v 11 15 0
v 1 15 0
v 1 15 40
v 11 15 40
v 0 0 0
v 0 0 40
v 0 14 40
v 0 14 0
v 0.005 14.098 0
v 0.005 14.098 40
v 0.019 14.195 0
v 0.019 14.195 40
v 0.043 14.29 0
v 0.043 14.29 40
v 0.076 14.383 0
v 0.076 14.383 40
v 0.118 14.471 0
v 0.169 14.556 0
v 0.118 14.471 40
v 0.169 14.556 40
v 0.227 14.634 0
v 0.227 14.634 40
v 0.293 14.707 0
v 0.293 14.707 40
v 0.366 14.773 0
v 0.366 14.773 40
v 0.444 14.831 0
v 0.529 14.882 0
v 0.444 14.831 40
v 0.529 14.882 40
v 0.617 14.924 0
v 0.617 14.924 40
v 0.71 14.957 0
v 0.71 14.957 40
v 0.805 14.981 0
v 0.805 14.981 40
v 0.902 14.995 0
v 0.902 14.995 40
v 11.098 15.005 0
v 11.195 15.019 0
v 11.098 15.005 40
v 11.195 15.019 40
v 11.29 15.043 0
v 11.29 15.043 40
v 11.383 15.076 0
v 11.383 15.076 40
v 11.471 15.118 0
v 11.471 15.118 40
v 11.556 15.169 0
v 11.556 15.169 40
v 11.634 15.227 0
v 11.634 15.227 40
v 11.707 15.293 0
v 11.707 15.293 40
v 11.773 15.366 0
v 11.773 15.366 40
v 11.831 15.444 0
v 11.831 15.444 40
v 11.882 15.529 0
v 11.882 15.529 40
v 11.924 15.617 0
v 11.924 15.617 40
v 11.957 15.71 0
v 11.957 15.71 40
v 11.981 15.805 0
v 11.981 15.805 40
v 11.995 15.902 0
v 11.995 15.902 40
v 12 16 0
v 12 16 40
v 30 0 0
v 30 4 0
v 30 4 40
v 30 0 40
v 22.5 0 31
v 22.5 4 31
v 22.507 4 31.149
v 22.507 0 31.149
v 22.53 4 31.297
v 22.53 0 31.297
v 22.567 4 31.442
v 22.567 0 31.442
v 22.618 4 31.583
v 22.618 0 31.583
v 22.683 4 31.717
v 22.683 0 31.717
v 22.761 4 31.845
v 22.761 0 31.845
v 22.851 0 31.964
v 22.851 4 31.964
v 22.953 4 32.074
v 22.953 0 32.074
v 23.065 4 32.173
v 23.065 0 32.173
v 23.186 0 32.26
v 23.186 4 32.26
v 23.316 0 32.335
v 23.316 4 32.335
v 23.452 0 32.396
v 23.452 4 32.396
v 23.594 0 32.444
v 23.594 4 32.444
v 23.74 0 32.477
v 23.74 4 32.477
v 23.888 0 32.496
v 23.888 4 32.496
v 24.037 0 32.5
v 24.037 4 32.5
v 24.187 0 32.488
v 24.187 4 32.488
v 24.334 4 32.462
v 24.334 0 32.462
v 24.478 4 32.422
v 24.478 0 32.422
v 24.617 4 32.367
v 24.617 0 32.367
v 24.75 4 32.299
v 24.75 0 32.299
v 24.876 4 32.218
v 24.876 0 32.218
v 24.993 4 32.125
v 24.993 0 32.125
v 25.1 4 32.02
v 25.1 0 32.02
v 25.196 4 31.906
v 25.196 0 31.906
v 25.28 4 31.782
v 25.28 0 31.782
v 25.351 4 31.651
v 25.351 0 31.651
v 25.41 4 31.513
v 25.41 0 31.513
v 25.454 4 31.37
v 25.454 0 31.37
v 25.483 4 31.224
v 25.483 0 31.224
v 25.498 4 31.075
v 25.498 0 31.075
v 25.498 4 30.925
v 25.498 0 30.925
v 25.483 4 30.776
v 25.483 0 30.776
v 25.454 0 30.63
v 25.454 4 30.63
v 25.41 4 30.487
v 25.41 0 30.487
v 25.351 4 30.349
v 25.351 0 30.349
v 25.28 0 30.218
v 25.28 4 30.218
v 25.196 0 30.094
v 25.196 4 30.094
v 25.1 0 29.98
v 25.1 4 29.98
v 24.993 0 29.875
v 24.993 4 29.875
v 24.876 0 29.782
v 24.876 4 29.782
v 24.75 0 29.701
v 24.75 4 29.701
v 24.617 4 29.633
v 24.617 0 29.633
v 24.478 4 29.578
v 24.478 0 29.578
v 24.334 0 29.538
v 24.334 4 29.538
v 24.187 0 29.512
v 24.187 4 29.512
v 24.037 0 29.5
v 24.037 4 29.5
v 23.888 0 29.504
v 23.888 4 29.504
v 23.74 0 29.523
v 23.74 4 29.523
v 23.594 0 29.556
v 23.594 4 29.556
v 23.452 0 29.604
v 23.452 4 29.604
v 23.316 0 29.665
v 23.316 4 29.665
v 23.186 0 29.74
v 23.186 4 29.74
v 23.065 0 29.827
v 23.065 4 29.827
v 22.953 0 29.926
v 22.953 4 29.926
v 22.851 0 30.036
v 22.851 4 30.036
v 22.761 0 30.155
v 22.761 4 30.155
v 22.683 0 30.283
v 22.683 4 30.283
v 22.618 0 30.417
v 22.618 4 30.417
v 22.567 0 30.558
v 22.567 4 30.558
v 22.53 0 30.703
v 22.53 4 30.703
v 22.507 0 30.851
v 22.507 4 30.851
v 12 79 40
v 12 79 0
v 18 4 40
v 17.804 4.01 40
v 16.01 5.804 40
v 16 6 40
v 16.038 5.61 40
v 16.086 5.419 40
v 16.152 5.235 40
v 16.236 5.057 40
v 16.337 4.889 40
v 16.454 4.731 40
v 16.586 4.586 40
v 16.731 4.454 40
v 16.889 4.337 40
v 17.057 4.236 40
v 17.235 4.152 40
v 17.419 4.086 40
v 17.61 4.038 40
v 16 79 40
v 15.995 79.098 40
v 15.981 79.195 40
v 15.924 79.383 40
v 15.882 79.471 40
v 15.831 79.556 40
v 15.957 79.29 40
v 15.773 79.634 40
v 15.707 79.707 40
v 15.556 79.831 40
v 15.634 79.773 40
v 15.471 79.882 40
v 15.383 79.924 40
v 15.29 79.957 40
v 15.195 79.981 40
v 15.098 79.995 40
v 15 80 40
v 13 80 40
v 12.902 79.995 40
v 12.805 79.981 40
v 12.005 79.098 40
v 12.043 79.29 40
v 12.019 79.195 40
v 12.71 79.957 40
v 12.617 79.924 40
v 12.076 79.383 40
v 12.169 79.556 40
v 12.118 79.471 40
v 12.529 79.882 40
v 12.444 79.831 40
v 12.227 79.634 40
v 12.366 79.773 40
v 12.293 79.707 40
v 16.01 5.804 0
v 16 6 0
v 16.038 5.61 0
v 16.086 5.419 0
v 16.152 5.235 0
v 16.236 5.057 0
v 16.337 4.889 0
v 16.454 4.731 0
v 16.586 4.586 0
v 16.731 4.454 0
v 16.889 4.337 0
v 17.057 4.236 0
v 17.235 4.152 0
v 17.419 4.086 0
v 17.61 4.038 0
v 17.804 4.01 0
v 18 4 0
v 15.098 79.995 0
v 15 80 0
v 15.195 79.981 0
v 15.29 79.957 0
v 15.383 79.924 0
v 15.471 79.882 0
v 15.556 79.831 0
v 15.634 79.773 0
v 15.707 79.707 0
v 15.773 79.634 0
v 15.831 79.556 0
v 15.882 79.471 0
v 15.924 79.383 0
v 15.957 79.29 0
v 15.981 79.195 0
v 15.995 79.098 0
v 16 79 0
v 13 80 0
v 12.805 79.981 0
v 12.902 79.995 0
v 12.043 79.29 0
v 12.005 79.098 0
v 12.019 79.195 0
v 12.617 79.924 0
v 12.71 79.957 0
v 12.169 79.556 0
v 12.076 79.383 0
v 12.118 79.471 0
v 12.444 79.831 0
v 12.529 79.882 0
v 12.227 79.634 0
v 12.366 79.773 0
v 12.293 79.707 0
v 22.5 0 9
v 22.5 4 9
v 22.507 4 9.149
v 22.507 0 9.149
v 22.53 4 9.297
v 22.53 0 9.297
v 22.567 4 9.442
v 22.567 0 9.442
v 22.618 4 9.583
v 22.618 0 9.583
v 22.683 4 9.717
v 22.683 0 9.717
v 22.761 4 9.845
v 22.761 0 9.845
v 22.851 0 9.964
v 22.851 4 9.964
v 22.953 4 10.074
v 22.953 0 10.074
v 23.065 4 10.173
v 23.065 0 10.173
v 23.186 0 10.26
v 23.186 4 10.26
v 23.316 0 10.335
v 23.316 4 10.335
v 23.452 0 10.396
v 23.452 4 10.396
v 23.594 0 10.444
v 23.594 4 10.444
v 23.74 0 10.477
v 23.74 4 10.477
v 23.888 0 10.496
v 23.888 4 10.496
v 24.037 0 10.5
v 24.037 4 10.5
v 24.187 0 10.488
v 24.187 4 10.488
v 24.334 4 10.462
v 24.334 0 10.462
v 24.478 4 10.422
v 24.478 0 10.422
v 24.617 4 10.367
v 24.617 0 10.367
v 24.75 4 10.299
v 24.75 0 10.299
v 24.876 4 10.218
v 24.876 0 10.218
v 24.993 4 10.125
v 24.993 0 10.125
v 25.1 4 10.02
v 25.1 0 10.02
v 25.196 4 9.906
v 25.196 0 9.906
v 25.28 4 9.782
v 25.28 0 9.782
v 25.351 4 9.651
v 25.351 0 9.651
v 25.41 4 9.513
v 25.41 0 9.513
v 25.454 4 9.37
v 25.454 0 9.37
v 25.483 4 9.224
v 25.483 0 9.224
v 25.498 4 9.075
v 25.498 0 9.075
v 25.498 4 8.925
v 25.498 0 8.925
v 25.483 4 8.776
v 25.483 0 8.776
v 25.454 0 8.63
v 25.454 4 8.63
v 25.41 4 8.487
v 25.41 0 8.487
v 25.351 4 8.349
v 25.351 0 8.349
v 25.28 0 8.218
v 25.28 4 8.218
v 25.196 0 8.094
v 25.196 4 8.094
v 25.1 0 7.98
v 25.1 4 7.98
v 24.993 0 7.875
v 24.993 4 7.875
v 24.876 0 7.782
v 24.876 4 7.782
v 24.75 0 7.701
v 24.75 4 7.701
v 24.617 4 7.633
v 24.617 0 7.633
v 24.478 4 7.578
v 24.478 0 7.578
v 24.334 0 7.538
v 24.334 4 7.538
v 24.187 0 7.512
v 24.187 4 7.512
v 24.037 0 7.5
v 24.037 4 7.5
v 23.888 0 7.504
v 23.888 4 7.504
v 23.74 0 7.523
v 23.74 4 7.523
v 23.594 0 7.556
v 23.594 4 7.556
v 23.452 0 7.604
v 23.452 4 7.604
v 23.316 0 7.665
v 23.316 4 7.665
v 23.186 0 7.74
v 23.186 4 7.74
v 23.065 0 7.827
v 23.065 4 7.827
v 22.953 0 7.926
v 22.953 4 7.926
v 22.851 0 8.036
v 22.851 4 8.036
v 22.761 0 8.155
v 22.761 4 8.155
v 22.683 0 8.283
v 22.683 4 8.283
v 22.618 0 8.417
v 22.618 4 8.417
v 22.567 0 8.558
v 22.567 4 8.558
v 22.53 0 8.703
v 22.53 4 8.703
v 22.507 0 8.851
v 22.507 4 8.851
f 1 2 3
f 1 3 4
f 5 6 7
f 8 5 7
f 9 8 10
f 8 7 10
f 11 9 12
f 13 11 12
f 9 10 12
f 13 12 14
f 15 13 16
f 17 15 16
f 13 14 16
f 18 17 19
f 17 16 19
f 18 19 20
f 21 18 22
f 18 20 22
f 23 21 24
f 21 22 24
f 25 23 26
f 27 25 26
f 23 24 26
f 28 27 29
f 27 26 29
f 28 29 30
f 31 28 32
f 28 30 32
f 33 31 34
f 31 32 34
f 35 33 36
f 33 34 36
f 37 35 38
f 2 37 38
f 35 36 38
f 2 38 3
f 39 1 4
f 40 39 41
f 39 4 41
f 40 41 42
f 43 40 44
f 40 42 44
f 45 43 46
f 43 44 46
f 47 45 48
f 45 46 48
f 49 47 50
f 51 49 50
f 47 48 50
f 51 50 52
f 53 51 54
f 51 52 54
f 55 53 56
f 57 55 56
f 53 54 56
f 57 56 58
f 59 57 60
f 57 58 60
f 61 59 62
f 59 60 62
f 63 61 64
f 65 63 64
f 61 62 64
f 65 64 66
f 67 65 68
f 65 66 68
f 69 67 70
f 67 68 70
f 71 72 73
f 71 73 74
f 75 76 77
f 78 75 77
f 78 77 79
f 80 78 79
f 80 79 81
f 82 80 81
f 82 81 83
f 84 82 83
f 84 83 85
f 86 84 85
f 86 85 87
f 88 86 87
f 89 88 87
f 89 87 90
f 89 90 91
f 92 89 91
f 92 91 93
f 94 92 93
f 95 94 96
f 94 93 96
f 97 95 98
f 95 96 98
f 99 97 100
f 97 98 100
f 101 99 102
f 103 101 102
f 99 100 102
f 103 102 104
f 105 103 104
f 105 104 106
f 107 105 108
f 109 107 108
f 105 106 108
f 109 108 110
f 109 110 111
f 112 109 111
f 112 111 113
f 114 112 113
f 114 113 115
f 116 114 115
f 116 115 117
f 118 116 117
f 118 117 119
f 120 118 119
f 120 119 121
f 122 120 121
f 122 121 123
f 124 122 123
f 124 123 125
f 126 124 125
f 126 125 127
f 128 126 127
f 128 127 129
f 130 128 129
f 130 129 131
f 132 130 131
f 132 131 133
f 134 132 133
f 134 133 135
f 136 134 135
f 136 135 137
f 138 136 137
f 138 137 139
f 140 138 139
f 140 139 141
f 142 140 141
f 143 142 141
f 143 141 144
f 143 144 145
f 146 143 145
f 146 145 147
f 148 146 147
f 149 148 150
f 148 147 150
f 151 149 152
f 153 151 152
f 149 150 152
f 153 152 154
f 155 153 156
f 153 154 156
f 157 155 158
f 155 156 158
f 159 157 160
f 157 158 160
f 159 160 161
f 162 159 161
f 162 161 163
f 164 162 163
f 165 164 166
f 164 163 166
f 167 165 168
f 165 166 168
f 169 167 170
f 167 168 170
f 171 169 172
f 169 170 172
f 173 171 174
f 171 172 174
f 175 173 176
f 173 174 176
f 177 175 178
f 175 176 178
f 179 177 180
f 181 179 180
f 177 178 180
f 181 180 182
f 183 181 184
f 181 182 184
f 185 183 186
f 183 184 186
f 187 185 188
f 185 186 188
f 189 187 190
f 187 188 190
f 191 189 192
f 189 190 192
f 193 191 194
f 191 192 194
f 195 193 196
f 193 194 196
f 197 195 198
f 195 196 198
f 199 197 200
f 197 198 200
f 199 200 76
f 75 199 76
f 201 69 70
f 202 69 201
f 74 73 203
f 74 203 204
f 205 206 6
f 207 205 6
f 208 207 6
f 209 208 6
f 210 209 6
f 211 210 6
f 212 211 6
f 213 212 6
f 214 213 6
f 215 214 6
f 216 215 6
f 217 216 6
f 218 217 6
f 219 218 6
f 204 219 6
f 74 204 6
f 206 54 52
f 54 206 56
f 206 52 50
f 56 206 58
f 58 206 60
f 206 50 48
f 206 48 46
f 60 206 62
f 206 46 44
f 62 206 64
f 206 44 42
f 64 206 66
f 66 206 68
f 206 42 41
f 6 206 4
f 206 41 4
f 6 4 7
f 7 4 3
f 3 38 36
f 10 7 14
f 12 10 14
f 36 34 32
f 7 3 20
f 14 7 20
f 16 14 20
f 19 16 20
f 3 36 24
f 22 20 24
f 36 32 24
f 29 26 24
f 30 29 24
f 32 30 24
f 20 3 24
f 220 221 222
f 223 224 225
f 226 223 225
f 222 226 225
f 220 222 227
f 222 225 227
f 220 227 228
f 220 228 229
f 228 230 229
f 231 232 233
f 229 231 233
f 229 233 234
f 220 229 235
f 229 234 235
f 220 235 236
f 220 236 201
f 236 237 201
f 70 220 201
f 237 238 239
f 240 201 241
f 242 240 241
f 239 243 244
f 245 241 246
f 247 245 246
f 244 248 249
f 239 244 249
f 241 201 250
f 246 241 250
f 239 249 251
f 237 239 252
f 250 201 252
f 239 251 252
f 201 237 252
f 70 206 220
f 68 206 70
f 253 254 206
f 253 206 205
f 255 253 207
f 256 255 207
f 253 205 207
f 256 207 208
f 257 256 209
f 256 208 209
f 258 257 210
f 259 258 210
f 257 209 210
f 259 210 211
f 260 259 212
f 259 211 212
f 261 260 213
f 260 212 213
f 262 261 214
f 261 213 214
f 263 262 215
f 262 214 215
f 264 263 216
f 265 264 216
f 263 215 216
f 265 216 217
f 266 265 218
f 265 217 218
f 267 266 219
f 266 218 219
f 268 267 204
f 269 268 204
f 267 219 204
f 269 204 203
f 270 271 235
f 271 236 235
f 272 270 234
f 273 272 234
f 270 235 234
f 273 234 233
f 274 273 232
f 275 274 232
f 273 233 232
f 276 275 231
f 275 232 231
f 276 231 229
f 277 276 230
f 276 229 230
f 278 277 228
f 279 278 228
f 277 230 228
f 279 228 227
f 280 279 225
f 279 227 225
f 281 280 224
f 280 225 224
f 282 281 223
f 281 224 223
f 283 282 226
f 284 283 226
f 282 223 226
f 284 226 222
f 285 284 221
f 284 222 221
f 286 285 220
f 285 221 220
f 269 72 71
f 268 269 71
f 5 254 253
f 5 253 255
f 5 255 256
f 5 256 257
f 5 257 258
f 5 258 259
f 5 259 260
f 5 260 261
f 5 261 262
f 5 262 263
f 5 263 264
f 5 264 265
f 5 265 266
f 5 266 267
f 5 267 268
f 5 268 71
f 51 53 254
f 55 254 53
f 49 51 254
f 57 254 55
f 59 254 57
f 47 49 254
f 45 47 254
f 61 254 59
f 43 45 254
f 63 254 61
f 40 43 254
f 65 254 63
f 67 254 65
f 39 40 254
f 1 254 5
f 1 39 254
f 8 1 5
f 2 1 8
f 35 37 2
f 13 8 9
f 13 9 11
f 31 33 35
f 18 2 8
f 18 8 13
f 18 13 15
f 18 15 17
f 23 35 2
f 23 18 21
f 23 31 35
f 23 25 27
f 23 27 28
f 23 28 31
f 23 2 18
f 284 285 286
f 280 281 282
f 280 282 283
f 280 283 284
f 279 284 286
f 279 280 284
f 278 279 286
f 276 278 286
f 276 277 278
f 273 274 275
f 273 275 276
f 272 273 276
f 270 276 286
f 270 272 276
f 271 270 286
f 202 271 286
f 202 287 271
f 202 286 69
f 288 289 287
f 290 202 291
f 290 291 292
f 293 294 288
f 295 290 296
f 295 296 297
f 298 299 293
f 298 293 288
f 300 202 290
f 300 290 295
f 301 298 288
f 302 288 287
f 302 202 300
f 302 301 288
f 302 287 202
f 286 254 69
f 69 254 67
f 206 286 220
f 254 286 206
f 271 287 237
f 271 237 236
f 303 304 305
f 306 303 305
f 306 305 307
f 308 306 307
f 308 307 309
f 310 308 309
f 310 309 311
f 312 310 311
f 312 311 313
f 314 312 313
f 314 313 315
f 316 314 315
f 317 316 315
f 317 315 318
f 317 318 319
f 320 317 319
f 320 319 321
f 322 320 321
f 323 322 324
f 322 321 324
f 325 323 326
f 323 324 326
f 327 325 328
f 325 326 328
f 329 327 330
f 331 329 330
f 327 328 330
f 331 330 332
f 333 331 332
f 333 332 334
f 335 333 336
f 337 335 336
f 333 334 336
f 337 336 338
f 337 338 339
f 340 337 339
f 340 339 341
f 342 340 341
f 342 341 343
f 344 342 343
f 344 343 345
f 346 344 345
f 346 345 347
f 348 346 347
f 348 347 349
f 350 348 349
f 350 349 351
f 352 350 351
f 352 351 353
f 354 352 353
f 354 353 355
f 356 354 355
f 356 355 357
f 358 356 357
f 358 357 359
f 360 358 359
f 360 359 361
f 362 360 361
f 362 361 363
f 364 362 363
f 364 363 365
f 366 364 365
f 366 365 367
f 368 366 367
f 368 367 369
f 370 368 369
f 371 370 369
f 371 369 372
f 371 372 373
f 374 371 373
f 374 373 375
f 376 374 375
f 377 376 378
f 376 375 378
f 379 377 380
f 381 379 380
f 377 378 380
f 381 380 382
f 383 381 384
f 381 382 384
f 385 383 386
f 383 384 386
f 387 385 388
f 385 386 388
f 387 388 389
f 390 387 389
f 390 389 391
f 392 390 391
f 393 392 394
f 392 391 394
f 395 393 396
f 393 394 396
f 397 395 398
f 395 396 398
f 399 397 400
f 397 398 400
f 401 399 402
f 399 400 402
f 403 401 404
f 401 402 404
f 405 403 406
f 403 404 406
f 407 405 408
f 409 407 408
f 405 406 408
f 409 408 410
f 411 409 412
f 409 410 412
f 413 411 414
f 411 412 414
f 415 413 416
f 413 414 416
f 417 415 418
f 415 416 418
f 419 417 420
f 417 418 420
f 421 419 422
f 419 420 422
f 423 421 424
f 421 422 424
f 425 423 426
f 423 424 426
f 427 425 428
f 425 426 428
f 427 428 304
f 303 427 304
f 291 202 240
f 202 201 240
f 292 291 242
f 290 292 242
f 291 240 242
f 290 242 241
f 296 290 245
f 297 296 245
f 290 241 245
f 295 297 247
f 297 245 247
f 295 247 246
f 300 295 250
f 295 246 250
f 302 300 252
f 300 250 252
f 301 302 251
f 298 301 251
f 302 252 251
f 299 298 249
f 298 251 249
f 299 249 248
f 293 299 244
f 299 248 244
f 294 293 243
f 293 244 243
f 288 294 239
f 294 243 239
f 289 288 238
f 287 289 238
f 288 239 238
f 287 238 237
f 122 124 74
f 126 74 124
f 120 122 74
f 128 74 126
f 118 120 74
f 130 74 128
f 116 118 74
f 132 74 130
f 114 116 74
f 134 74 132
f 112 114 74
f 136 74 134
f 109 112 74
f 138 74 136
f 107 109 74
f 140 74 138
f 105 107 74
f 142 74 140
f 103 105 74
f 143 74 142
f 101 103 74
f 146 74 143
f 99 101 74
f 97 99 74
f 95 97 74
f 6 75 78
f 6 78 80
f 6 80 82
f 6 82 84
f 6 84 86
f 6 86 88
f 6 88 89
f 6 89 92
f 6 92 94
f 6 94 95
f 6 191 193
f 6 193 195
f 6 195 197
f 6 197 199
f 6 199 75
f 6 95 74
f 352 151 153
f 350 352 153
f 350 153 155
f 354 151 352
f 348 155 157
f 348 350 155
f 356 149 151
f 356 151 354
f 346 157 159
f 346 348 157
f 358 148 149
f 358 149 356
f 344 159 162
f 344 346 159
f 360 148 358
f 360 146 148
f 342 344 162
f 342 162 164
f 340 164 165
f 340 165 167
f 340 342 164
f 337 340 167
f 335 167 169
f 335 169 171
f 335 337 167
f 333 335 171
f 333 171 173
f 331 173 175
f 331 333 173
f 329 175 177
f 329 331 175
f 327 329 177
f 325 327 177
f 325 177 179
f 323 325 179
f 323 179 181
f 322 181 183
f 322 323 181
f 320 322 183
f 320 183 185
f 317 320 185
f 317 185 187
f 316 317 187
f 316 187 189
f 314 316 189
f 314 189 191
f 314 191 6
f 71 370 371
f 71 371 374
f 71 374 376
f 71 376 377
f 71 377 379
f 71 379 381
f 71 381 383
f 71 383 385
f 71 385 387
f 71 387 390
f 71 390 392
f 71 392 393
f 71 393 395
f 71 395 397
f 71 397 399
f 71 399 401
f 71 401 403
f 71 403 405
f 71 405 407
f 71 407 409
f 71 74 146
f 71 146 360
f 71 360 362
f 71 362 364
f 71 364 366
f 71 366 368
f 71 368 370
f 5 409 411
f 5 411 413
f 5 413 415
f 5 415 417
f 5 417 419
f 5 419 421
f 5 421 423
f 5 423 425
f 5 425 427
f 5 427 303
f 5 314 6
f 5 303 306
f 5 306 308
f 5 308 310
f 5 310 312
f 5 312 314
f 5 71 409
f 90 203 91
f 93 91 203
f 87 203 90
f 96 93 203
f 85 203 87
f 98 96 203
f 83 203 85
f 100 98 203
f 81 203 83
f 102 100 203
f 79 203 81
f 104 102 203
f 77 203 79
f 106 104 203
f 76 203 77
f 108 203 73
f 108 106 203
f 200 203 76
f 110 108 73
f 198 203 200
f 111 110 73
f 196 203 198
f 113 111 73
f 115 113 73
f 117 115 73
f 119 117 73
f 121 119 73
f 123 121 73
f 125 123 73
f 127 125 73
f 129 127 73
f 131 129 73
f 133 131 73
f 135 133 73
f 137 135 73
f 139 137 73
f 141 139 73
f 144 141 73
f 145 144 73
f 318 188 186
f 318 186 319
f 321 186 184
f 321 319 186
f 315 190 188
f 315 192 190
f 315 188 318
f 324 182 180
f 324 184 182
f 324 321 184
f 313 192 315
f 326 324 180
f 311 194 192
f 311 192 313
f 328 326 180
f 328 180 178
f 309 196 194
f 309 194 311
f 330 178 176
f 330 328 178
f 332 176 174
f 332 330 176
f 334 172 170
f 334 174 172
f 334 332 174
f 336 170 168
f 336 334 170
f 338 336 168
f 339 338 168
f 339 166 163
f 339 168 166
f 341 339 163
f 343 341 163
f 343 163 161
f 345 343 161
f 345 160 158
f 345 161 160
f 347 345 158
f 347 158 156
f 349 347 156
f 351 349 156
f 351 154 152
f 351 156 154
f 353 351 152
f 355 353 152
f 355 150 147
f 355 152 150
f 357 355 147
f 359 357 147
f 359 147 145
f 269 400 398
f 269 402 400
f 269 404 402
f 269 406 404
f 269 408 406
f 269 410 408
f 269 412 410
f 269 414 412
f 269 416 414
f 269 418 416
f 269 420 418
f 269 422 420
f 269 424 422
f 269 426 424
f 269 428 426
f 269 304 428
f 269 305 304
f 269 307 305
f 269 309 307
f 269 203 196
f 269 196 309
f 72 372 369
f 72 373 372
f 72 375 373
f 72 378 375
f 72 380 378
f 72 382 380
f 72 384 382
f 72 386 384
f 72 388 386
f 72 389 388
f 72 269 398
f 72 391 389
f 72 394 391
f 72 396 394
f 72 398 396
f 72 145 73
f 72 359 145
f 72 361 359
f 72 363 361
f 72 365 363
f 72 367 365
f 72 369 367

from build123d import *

# Parameters (mm, degrees)
PAD_DEPTH    = 40
FILLET_R     = 1
FILLET001_R  = 1
FILLET002_R  = 2
FILLET003_R  = 1
FILLET004_R  = 1
SKETCH001_R  = 1.5
POCKET_DEPTH = 5


with BuildPart() as part:
    # Sketch → Pad (new body)
    with BuildSketch(Plane.XY):
        Polygon((0, 0), (0, 15), (12, 15), (12, 80), (16, 80), (16, 4), (30, 4), (30, 0), align=None)
    extrude(amount=PAD_DEPTH)

    # Fillet
    fillet_edges = [part.edges().sort_by_distance(p)[0] for p in [
        (12, 80, 20),
    ]]
    fillet(fillet_edges, radius=FILLET_R)

    # Fillet001
    fillet001_edges = [part.edges().sort_by_distance(p)[0] for p in [
        (16, 80, 20),
    ]]
    fillet(fillet001_edges, radius=FILLET001_R)

    # Fillet002
    fillet002_edges = [part.edges().sort_by_distance(p)[0] for p in [
        (16, 4, 20),
    ]]
    fillet(fillet002_edges, radius=FILLET002_R)

    # Fillet003
    fillet003_edges = [part.edges().sort_by_distance(p)[0] for p in [
        (0, 15, 20),
    ]]
    fillet(fillet003_edges, radius=FILLET003_R)

    # Fillet004
    fillet004_edges = [part.edges().sort_by_distance(p)[0] for p in [
        (12, 15, 20),
    ]]
    fillet(fillet004_edges, radius=FILLET004_R)

    # Sketch001 (on Face12 of Fillet004) → Pocket (cut)
    with BuildSketch(Plane(origin=(0, 4, 0), x_dir=(-1, 0, 0), z_dir=(0, 1, 0))):
        with Locations((-24, 31)):
            Circle(SKETCH001_R)
        with Locations((-24, 9)):
            Circle(SKETCH001_R)
    extrude(amount=-POCKET_DEPTH, mode=Mode.SUBTRACT)


solid = part.part
